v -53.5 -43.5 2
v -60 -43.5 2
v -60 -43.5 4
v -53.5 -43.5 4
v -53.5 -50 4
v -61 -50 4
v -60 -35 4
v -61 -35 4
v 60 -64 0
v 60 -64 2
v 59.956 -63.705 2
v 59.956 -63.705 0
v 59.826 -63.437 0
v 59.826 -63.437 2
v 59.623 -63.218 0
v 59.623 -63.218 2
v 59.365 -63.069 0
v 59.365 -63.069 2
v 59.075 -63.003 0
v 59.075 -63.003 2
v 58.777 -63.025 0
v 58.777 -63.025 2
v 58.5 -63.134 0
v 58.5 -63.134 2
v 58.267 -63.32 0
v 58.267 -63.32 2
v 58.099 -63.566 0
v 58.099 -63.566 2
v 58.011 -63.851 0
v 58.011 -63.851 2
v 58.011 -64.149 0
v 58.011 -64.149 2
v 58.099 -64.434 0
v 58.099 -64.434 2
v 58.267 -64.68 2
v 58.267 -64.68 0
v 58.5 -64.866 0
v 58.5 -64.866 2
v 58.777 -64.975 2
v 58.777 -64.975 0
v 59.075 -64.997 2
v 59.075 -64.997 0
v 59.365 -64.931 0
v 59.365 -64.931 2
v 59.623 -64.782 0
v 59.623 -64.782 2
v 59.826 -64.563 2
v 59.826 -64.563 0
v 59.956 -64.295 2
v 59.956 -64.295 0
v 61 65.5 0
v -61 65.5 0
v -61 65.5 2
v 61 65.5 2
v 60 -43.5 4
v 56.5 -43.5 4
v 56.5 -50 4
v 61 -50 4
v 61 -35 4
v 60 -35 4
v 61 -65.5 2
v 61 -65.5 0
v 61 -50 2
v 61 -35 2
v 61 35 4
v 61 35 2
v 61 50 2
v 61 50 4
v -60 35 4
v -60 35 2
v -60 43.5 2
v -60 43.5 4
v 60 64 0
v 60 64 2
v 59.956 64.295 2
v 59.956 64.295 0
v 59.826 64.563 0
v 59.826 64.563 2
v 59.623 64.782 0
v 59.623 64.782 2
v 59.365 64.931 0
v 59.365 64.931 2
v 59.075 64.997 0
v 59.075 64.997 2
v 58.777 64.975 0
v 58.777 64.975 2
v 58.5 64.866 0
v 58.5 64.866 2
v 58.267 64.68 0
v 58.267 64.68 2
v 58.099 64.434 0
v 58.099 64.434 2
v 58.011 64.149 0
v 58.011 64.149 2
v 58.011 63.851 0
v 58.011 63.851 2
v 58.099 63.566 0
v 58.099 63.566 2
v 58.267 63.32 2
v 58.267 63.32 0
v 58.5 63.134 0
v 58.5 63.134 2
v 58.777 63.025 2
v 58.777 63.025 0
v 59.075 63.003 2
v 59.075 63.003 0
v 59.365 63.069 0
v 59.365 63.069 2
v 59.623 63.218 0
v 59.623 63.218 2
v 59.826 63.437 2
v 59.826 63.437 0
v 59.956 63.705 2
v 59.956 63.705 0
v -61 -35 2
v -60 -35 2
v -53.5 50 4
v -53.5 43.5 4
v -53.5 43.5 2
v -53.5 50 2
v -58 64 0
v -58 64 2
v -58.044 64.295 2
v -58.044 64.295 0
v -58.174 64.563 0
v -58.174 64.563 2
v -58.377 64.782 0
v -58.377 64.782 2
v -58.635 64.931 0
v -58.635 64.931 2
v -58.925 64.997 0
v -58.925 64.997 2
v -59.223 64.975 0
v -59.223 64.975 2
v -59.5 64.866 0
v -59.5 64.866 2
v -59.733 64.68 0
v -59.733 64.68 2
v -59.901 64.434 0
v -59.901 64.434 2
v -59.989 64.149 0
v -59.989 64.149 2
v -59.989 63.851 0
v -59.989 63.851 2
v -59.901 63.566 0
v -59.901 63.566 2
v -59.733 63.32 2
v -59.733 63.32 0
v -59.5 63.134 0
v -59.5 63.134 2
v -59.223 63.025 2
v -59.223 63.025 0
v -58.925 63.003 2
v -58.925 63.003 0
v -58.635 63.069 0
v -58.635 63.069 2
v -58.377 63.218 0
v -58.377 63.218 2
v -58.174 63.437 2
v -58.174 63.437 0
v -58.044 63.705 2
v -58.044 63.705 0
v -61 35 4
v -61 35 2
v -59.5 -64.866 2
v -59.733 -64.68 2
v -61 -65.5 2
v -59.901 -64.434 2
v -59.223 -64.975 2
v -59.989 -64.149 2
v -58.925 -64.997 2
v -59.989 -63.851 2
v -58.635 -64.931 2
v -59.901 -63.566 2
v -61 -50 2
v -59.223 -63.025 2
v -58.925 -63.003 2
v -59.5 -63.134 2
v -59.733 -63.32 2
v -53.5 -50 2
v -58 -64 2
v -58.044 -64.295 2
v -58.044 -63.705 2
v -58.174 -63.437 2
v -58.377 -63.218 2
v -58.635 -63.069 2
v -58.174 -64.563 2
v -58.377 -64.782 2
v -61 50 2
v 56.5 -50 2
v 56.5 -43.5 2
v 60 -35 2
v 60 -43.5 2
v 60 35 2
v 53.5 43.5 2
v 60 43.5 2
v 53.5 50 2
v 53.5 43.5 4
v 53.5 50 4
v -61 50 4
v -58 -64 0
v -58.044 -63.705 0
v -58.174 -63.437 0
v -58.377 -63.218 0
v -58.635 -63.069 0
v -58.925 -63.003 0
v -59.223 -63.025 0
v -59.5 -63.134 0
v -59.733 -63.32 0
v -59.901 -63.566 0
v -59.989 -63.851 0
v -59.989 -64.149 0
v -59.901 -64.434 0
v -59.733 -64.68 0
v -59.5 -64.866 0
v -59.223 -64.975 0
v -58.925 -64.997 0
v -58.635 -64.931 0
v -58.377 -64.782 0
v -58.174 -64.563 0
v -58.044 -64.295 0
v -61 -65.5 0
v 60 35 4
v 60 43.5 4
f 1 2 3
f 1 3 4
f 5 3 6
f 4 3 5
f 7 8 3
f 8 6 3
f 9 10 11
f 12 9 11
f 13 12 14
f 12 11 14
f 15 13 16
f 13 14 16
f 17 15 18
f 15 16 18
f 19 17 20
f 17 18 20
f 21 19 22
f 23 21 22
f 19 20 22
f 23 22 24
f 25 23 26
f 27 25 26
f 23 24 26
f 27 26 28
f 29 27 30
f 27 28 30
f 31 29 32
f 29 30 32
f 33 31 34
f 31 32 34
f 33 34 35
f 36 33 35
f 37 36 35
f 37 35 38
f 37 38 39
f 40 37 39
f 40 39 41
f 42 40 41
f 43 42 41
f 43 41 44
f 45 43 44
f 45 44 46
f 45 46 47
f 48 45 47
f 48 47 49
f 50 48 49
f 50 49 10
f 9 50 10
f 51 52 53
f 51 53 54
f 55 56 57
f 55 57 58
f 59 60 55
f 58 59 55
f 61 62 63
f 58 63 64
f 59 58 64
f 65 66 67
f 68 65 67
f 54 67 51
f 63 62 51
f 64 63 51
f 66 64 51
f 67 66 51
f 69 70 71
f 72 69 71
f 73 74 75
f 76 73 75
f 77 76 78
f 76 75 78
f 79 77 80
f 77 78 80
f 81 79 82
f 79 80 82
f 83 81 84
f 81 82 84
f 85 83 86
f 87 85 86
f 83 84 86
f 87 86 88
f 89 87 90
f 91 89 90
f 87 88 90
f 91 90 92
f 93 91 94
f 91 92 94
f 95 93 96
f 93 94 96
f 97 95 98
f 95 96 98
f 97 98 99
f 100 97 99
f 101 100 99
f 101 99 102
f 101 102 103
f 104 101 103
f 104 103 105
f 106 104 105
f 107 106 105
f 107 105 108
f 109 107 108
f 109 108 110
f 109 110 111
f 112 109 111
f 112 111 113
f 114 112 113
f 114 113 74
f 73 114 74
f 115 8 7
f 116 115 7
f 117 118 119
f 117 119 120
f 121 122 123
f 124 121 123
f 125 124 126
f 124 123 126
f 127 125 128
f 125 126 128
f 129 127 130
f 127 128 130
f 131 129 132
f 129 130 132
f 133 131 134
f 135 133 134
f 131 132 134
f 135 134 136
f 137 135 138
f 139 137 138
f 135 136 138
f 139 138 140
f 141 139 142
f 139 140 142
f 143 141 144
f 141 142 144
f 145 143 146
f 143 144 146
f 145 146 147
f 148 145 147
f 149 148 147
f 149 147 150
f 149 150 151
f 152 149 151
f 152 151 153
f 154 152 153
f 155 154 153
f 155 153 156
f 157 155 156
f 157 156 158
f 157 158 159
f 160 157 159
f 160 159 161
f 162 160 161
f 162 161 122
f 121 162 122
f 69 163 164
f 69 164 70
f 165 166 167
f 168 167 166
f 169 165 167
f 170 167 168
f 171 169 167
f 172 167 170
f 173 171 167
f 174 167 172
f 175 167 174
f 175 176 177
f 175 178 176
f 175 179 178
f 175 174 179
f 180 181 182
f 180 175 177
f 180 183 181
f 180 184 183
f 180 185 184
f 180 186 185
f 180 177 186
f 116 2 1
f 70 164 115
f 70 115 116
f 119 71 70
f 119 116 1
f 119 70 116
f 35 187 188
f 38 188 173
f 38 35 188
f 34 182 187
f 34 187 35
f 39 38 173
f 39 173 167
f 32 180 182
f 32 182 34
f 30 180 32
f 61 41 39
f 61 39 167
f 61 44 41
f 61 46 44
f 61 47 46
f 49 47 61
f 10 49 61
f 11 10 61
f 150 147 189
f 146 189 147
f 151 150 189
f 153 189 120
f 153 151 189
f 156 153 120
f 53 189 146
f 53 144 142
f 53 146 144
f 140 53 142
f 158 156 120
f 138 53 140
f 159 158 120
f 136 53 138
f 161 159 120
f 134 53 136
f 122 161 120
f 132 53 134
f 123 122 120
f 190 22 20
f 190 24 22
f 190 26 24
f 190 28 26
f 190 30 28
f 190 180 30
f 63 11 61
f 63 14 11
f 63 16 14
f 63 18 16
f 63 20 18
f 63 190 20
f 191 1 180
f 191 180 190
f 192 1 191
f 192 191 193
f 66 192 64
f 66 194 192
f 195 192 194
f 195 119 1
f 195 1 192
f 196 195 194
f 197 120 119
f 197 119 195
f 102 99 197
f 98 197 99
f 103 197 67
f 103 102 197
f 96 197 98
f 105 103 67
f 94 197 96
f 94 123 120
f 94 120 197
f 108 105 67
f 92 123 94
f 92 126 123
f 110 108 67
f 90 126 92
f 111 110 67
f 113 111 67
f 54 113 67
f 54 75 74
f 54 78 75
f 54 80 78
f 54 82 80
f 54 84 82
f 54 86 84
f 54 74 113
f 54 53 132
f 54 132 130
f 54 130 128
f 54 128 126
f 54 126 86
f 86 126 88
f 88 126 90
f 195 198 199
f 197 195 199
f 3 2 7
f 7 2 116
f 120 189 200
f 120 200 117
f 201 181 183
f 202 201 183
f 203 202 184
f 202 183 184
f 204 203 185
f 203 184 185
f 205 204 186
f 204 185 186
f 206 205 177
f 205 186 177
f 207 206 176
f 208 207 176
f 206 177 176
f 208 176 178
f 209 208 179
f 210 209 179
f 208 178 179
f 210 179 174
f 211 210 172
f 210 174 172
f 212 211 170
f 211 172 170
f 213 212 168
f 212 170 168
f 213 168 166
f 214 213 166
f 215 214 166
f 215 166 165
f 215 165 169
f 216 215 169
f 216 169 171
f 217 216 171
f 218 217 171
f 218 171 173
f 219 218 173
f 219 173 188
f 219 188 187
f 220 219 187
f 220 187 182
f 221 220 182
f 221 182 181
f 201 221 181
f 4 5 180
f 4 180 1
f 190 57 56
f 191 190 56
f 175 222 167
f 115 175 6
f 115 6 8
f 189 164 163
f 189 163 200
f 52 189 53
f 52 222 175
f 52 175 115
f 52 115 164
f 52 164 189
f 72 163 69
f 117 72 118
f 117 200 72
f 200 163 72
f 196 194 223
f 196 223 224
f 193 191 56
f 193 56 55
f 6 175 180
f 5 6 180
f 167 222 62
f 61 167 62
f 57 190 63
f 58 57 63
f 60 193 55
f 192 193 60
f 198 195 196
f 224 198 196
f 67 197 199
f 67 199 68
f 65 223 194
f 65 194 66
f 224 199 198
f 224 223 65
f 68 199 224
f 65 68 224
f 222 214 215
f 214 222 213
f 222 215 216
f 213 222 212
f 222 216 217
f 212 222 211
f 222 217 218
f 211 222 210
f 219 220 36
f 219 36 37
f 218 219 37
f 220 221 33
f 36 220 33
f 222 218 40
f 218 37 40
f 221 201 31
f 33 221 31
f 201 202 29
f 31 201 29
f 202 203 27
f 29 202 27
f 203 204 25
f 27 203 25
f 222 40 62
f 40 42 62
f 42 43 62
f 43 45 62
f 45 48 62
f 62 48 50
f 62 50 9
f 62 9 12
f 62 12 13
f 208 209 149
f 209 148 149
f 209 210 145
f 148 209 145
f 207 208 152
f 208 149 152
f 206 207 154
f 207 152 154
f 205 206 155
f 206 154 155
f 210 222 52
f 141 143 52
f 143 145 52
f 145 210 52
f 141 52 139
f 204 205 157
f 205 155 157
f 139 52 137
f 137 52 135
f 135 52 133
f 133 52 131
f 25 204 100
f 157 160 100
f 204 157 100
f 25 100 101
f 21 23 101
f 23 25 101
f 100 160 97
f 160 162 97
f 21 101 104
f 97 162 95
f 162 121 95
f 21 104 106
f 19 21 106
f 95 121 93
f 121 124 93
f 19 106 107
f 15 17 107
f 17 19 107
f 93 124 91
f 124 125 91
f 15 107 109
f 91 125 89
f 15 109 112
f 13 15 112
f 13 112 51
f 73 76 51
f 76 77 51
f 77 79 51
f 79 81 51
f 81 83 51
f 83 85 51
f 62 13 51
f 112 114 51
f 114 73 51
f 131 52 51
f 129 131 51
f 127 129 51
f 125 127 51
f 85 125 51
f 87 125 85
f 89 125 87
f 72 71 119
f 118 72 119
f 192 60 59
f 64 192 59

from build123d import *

# Parameters (mm, degrees)
F0_W     = 122
F0_H     = 131
F1_DEPTH = 2
F2_R     = 1
F3_DEPTH = 2.001
F5_W     = 122
F5_H     = 100
F5_W_2   = 120
F5_H_2   = 87
F6_DEPTH = 2
F7_W     = 107
F7_H     = 6.5
F7_W_2   = 1
F7_H_2   = 70
F7_W_3   = 110
F8_DEPTH = 2


with BuildPart() as f1:
    # F0 (on Top) → F1 (new body)
    with BuildSketch(Plane.XY):
        Rectangle(F0_W, F0_H)
    extrude(amount=F1_DEPTH)

    # F2 (on face) → F3 (cut, through all)
    with BuildSketch(Plane.XY.offset(2)):
        with Locations((59, 64)):
            Circle(F2_R)
        with Locations((59, -64)):
            Circle(F2_R)
        with Locations((-59, -64)):
            Circle(F2_R)
        with Locations((-59, 64)):
            Circle(F2_R)
    extrude(amount=-F3_DEPTH, mode=Mode.SUBTRACT)

    # F5 (on face) → F6 (join)
    with BuildSketch(Plane.XY.offset(2)):
        Rectangle(F5_W, F5_H)
        Rectangle(F5_W_2, F5_H_2, mode=Mode.SUBTRACT)
    extrude(amount=F6_DEPTH)

    # F7 (on face) → F8 (cut)
    with BuildSketch(Plane.XY.offset(4)):
        with Locations((0, 46.75)):
            Rectangle(F7_W, F7_H)
        with Locations((60.5, 0)):
            Rectangle(F7_W_2, F7_H_2)
        with Locations((1.5, -46.75)):
            Rectangle(F7_W_3, F7_H)
        with Locations((-60.5, 0)):
            Rectangle(F7_W_2, F7_H_2)
    extrude(amount=-F8_DEPTH, mode=Mode.SUBTRACT)


solid = f1.part
